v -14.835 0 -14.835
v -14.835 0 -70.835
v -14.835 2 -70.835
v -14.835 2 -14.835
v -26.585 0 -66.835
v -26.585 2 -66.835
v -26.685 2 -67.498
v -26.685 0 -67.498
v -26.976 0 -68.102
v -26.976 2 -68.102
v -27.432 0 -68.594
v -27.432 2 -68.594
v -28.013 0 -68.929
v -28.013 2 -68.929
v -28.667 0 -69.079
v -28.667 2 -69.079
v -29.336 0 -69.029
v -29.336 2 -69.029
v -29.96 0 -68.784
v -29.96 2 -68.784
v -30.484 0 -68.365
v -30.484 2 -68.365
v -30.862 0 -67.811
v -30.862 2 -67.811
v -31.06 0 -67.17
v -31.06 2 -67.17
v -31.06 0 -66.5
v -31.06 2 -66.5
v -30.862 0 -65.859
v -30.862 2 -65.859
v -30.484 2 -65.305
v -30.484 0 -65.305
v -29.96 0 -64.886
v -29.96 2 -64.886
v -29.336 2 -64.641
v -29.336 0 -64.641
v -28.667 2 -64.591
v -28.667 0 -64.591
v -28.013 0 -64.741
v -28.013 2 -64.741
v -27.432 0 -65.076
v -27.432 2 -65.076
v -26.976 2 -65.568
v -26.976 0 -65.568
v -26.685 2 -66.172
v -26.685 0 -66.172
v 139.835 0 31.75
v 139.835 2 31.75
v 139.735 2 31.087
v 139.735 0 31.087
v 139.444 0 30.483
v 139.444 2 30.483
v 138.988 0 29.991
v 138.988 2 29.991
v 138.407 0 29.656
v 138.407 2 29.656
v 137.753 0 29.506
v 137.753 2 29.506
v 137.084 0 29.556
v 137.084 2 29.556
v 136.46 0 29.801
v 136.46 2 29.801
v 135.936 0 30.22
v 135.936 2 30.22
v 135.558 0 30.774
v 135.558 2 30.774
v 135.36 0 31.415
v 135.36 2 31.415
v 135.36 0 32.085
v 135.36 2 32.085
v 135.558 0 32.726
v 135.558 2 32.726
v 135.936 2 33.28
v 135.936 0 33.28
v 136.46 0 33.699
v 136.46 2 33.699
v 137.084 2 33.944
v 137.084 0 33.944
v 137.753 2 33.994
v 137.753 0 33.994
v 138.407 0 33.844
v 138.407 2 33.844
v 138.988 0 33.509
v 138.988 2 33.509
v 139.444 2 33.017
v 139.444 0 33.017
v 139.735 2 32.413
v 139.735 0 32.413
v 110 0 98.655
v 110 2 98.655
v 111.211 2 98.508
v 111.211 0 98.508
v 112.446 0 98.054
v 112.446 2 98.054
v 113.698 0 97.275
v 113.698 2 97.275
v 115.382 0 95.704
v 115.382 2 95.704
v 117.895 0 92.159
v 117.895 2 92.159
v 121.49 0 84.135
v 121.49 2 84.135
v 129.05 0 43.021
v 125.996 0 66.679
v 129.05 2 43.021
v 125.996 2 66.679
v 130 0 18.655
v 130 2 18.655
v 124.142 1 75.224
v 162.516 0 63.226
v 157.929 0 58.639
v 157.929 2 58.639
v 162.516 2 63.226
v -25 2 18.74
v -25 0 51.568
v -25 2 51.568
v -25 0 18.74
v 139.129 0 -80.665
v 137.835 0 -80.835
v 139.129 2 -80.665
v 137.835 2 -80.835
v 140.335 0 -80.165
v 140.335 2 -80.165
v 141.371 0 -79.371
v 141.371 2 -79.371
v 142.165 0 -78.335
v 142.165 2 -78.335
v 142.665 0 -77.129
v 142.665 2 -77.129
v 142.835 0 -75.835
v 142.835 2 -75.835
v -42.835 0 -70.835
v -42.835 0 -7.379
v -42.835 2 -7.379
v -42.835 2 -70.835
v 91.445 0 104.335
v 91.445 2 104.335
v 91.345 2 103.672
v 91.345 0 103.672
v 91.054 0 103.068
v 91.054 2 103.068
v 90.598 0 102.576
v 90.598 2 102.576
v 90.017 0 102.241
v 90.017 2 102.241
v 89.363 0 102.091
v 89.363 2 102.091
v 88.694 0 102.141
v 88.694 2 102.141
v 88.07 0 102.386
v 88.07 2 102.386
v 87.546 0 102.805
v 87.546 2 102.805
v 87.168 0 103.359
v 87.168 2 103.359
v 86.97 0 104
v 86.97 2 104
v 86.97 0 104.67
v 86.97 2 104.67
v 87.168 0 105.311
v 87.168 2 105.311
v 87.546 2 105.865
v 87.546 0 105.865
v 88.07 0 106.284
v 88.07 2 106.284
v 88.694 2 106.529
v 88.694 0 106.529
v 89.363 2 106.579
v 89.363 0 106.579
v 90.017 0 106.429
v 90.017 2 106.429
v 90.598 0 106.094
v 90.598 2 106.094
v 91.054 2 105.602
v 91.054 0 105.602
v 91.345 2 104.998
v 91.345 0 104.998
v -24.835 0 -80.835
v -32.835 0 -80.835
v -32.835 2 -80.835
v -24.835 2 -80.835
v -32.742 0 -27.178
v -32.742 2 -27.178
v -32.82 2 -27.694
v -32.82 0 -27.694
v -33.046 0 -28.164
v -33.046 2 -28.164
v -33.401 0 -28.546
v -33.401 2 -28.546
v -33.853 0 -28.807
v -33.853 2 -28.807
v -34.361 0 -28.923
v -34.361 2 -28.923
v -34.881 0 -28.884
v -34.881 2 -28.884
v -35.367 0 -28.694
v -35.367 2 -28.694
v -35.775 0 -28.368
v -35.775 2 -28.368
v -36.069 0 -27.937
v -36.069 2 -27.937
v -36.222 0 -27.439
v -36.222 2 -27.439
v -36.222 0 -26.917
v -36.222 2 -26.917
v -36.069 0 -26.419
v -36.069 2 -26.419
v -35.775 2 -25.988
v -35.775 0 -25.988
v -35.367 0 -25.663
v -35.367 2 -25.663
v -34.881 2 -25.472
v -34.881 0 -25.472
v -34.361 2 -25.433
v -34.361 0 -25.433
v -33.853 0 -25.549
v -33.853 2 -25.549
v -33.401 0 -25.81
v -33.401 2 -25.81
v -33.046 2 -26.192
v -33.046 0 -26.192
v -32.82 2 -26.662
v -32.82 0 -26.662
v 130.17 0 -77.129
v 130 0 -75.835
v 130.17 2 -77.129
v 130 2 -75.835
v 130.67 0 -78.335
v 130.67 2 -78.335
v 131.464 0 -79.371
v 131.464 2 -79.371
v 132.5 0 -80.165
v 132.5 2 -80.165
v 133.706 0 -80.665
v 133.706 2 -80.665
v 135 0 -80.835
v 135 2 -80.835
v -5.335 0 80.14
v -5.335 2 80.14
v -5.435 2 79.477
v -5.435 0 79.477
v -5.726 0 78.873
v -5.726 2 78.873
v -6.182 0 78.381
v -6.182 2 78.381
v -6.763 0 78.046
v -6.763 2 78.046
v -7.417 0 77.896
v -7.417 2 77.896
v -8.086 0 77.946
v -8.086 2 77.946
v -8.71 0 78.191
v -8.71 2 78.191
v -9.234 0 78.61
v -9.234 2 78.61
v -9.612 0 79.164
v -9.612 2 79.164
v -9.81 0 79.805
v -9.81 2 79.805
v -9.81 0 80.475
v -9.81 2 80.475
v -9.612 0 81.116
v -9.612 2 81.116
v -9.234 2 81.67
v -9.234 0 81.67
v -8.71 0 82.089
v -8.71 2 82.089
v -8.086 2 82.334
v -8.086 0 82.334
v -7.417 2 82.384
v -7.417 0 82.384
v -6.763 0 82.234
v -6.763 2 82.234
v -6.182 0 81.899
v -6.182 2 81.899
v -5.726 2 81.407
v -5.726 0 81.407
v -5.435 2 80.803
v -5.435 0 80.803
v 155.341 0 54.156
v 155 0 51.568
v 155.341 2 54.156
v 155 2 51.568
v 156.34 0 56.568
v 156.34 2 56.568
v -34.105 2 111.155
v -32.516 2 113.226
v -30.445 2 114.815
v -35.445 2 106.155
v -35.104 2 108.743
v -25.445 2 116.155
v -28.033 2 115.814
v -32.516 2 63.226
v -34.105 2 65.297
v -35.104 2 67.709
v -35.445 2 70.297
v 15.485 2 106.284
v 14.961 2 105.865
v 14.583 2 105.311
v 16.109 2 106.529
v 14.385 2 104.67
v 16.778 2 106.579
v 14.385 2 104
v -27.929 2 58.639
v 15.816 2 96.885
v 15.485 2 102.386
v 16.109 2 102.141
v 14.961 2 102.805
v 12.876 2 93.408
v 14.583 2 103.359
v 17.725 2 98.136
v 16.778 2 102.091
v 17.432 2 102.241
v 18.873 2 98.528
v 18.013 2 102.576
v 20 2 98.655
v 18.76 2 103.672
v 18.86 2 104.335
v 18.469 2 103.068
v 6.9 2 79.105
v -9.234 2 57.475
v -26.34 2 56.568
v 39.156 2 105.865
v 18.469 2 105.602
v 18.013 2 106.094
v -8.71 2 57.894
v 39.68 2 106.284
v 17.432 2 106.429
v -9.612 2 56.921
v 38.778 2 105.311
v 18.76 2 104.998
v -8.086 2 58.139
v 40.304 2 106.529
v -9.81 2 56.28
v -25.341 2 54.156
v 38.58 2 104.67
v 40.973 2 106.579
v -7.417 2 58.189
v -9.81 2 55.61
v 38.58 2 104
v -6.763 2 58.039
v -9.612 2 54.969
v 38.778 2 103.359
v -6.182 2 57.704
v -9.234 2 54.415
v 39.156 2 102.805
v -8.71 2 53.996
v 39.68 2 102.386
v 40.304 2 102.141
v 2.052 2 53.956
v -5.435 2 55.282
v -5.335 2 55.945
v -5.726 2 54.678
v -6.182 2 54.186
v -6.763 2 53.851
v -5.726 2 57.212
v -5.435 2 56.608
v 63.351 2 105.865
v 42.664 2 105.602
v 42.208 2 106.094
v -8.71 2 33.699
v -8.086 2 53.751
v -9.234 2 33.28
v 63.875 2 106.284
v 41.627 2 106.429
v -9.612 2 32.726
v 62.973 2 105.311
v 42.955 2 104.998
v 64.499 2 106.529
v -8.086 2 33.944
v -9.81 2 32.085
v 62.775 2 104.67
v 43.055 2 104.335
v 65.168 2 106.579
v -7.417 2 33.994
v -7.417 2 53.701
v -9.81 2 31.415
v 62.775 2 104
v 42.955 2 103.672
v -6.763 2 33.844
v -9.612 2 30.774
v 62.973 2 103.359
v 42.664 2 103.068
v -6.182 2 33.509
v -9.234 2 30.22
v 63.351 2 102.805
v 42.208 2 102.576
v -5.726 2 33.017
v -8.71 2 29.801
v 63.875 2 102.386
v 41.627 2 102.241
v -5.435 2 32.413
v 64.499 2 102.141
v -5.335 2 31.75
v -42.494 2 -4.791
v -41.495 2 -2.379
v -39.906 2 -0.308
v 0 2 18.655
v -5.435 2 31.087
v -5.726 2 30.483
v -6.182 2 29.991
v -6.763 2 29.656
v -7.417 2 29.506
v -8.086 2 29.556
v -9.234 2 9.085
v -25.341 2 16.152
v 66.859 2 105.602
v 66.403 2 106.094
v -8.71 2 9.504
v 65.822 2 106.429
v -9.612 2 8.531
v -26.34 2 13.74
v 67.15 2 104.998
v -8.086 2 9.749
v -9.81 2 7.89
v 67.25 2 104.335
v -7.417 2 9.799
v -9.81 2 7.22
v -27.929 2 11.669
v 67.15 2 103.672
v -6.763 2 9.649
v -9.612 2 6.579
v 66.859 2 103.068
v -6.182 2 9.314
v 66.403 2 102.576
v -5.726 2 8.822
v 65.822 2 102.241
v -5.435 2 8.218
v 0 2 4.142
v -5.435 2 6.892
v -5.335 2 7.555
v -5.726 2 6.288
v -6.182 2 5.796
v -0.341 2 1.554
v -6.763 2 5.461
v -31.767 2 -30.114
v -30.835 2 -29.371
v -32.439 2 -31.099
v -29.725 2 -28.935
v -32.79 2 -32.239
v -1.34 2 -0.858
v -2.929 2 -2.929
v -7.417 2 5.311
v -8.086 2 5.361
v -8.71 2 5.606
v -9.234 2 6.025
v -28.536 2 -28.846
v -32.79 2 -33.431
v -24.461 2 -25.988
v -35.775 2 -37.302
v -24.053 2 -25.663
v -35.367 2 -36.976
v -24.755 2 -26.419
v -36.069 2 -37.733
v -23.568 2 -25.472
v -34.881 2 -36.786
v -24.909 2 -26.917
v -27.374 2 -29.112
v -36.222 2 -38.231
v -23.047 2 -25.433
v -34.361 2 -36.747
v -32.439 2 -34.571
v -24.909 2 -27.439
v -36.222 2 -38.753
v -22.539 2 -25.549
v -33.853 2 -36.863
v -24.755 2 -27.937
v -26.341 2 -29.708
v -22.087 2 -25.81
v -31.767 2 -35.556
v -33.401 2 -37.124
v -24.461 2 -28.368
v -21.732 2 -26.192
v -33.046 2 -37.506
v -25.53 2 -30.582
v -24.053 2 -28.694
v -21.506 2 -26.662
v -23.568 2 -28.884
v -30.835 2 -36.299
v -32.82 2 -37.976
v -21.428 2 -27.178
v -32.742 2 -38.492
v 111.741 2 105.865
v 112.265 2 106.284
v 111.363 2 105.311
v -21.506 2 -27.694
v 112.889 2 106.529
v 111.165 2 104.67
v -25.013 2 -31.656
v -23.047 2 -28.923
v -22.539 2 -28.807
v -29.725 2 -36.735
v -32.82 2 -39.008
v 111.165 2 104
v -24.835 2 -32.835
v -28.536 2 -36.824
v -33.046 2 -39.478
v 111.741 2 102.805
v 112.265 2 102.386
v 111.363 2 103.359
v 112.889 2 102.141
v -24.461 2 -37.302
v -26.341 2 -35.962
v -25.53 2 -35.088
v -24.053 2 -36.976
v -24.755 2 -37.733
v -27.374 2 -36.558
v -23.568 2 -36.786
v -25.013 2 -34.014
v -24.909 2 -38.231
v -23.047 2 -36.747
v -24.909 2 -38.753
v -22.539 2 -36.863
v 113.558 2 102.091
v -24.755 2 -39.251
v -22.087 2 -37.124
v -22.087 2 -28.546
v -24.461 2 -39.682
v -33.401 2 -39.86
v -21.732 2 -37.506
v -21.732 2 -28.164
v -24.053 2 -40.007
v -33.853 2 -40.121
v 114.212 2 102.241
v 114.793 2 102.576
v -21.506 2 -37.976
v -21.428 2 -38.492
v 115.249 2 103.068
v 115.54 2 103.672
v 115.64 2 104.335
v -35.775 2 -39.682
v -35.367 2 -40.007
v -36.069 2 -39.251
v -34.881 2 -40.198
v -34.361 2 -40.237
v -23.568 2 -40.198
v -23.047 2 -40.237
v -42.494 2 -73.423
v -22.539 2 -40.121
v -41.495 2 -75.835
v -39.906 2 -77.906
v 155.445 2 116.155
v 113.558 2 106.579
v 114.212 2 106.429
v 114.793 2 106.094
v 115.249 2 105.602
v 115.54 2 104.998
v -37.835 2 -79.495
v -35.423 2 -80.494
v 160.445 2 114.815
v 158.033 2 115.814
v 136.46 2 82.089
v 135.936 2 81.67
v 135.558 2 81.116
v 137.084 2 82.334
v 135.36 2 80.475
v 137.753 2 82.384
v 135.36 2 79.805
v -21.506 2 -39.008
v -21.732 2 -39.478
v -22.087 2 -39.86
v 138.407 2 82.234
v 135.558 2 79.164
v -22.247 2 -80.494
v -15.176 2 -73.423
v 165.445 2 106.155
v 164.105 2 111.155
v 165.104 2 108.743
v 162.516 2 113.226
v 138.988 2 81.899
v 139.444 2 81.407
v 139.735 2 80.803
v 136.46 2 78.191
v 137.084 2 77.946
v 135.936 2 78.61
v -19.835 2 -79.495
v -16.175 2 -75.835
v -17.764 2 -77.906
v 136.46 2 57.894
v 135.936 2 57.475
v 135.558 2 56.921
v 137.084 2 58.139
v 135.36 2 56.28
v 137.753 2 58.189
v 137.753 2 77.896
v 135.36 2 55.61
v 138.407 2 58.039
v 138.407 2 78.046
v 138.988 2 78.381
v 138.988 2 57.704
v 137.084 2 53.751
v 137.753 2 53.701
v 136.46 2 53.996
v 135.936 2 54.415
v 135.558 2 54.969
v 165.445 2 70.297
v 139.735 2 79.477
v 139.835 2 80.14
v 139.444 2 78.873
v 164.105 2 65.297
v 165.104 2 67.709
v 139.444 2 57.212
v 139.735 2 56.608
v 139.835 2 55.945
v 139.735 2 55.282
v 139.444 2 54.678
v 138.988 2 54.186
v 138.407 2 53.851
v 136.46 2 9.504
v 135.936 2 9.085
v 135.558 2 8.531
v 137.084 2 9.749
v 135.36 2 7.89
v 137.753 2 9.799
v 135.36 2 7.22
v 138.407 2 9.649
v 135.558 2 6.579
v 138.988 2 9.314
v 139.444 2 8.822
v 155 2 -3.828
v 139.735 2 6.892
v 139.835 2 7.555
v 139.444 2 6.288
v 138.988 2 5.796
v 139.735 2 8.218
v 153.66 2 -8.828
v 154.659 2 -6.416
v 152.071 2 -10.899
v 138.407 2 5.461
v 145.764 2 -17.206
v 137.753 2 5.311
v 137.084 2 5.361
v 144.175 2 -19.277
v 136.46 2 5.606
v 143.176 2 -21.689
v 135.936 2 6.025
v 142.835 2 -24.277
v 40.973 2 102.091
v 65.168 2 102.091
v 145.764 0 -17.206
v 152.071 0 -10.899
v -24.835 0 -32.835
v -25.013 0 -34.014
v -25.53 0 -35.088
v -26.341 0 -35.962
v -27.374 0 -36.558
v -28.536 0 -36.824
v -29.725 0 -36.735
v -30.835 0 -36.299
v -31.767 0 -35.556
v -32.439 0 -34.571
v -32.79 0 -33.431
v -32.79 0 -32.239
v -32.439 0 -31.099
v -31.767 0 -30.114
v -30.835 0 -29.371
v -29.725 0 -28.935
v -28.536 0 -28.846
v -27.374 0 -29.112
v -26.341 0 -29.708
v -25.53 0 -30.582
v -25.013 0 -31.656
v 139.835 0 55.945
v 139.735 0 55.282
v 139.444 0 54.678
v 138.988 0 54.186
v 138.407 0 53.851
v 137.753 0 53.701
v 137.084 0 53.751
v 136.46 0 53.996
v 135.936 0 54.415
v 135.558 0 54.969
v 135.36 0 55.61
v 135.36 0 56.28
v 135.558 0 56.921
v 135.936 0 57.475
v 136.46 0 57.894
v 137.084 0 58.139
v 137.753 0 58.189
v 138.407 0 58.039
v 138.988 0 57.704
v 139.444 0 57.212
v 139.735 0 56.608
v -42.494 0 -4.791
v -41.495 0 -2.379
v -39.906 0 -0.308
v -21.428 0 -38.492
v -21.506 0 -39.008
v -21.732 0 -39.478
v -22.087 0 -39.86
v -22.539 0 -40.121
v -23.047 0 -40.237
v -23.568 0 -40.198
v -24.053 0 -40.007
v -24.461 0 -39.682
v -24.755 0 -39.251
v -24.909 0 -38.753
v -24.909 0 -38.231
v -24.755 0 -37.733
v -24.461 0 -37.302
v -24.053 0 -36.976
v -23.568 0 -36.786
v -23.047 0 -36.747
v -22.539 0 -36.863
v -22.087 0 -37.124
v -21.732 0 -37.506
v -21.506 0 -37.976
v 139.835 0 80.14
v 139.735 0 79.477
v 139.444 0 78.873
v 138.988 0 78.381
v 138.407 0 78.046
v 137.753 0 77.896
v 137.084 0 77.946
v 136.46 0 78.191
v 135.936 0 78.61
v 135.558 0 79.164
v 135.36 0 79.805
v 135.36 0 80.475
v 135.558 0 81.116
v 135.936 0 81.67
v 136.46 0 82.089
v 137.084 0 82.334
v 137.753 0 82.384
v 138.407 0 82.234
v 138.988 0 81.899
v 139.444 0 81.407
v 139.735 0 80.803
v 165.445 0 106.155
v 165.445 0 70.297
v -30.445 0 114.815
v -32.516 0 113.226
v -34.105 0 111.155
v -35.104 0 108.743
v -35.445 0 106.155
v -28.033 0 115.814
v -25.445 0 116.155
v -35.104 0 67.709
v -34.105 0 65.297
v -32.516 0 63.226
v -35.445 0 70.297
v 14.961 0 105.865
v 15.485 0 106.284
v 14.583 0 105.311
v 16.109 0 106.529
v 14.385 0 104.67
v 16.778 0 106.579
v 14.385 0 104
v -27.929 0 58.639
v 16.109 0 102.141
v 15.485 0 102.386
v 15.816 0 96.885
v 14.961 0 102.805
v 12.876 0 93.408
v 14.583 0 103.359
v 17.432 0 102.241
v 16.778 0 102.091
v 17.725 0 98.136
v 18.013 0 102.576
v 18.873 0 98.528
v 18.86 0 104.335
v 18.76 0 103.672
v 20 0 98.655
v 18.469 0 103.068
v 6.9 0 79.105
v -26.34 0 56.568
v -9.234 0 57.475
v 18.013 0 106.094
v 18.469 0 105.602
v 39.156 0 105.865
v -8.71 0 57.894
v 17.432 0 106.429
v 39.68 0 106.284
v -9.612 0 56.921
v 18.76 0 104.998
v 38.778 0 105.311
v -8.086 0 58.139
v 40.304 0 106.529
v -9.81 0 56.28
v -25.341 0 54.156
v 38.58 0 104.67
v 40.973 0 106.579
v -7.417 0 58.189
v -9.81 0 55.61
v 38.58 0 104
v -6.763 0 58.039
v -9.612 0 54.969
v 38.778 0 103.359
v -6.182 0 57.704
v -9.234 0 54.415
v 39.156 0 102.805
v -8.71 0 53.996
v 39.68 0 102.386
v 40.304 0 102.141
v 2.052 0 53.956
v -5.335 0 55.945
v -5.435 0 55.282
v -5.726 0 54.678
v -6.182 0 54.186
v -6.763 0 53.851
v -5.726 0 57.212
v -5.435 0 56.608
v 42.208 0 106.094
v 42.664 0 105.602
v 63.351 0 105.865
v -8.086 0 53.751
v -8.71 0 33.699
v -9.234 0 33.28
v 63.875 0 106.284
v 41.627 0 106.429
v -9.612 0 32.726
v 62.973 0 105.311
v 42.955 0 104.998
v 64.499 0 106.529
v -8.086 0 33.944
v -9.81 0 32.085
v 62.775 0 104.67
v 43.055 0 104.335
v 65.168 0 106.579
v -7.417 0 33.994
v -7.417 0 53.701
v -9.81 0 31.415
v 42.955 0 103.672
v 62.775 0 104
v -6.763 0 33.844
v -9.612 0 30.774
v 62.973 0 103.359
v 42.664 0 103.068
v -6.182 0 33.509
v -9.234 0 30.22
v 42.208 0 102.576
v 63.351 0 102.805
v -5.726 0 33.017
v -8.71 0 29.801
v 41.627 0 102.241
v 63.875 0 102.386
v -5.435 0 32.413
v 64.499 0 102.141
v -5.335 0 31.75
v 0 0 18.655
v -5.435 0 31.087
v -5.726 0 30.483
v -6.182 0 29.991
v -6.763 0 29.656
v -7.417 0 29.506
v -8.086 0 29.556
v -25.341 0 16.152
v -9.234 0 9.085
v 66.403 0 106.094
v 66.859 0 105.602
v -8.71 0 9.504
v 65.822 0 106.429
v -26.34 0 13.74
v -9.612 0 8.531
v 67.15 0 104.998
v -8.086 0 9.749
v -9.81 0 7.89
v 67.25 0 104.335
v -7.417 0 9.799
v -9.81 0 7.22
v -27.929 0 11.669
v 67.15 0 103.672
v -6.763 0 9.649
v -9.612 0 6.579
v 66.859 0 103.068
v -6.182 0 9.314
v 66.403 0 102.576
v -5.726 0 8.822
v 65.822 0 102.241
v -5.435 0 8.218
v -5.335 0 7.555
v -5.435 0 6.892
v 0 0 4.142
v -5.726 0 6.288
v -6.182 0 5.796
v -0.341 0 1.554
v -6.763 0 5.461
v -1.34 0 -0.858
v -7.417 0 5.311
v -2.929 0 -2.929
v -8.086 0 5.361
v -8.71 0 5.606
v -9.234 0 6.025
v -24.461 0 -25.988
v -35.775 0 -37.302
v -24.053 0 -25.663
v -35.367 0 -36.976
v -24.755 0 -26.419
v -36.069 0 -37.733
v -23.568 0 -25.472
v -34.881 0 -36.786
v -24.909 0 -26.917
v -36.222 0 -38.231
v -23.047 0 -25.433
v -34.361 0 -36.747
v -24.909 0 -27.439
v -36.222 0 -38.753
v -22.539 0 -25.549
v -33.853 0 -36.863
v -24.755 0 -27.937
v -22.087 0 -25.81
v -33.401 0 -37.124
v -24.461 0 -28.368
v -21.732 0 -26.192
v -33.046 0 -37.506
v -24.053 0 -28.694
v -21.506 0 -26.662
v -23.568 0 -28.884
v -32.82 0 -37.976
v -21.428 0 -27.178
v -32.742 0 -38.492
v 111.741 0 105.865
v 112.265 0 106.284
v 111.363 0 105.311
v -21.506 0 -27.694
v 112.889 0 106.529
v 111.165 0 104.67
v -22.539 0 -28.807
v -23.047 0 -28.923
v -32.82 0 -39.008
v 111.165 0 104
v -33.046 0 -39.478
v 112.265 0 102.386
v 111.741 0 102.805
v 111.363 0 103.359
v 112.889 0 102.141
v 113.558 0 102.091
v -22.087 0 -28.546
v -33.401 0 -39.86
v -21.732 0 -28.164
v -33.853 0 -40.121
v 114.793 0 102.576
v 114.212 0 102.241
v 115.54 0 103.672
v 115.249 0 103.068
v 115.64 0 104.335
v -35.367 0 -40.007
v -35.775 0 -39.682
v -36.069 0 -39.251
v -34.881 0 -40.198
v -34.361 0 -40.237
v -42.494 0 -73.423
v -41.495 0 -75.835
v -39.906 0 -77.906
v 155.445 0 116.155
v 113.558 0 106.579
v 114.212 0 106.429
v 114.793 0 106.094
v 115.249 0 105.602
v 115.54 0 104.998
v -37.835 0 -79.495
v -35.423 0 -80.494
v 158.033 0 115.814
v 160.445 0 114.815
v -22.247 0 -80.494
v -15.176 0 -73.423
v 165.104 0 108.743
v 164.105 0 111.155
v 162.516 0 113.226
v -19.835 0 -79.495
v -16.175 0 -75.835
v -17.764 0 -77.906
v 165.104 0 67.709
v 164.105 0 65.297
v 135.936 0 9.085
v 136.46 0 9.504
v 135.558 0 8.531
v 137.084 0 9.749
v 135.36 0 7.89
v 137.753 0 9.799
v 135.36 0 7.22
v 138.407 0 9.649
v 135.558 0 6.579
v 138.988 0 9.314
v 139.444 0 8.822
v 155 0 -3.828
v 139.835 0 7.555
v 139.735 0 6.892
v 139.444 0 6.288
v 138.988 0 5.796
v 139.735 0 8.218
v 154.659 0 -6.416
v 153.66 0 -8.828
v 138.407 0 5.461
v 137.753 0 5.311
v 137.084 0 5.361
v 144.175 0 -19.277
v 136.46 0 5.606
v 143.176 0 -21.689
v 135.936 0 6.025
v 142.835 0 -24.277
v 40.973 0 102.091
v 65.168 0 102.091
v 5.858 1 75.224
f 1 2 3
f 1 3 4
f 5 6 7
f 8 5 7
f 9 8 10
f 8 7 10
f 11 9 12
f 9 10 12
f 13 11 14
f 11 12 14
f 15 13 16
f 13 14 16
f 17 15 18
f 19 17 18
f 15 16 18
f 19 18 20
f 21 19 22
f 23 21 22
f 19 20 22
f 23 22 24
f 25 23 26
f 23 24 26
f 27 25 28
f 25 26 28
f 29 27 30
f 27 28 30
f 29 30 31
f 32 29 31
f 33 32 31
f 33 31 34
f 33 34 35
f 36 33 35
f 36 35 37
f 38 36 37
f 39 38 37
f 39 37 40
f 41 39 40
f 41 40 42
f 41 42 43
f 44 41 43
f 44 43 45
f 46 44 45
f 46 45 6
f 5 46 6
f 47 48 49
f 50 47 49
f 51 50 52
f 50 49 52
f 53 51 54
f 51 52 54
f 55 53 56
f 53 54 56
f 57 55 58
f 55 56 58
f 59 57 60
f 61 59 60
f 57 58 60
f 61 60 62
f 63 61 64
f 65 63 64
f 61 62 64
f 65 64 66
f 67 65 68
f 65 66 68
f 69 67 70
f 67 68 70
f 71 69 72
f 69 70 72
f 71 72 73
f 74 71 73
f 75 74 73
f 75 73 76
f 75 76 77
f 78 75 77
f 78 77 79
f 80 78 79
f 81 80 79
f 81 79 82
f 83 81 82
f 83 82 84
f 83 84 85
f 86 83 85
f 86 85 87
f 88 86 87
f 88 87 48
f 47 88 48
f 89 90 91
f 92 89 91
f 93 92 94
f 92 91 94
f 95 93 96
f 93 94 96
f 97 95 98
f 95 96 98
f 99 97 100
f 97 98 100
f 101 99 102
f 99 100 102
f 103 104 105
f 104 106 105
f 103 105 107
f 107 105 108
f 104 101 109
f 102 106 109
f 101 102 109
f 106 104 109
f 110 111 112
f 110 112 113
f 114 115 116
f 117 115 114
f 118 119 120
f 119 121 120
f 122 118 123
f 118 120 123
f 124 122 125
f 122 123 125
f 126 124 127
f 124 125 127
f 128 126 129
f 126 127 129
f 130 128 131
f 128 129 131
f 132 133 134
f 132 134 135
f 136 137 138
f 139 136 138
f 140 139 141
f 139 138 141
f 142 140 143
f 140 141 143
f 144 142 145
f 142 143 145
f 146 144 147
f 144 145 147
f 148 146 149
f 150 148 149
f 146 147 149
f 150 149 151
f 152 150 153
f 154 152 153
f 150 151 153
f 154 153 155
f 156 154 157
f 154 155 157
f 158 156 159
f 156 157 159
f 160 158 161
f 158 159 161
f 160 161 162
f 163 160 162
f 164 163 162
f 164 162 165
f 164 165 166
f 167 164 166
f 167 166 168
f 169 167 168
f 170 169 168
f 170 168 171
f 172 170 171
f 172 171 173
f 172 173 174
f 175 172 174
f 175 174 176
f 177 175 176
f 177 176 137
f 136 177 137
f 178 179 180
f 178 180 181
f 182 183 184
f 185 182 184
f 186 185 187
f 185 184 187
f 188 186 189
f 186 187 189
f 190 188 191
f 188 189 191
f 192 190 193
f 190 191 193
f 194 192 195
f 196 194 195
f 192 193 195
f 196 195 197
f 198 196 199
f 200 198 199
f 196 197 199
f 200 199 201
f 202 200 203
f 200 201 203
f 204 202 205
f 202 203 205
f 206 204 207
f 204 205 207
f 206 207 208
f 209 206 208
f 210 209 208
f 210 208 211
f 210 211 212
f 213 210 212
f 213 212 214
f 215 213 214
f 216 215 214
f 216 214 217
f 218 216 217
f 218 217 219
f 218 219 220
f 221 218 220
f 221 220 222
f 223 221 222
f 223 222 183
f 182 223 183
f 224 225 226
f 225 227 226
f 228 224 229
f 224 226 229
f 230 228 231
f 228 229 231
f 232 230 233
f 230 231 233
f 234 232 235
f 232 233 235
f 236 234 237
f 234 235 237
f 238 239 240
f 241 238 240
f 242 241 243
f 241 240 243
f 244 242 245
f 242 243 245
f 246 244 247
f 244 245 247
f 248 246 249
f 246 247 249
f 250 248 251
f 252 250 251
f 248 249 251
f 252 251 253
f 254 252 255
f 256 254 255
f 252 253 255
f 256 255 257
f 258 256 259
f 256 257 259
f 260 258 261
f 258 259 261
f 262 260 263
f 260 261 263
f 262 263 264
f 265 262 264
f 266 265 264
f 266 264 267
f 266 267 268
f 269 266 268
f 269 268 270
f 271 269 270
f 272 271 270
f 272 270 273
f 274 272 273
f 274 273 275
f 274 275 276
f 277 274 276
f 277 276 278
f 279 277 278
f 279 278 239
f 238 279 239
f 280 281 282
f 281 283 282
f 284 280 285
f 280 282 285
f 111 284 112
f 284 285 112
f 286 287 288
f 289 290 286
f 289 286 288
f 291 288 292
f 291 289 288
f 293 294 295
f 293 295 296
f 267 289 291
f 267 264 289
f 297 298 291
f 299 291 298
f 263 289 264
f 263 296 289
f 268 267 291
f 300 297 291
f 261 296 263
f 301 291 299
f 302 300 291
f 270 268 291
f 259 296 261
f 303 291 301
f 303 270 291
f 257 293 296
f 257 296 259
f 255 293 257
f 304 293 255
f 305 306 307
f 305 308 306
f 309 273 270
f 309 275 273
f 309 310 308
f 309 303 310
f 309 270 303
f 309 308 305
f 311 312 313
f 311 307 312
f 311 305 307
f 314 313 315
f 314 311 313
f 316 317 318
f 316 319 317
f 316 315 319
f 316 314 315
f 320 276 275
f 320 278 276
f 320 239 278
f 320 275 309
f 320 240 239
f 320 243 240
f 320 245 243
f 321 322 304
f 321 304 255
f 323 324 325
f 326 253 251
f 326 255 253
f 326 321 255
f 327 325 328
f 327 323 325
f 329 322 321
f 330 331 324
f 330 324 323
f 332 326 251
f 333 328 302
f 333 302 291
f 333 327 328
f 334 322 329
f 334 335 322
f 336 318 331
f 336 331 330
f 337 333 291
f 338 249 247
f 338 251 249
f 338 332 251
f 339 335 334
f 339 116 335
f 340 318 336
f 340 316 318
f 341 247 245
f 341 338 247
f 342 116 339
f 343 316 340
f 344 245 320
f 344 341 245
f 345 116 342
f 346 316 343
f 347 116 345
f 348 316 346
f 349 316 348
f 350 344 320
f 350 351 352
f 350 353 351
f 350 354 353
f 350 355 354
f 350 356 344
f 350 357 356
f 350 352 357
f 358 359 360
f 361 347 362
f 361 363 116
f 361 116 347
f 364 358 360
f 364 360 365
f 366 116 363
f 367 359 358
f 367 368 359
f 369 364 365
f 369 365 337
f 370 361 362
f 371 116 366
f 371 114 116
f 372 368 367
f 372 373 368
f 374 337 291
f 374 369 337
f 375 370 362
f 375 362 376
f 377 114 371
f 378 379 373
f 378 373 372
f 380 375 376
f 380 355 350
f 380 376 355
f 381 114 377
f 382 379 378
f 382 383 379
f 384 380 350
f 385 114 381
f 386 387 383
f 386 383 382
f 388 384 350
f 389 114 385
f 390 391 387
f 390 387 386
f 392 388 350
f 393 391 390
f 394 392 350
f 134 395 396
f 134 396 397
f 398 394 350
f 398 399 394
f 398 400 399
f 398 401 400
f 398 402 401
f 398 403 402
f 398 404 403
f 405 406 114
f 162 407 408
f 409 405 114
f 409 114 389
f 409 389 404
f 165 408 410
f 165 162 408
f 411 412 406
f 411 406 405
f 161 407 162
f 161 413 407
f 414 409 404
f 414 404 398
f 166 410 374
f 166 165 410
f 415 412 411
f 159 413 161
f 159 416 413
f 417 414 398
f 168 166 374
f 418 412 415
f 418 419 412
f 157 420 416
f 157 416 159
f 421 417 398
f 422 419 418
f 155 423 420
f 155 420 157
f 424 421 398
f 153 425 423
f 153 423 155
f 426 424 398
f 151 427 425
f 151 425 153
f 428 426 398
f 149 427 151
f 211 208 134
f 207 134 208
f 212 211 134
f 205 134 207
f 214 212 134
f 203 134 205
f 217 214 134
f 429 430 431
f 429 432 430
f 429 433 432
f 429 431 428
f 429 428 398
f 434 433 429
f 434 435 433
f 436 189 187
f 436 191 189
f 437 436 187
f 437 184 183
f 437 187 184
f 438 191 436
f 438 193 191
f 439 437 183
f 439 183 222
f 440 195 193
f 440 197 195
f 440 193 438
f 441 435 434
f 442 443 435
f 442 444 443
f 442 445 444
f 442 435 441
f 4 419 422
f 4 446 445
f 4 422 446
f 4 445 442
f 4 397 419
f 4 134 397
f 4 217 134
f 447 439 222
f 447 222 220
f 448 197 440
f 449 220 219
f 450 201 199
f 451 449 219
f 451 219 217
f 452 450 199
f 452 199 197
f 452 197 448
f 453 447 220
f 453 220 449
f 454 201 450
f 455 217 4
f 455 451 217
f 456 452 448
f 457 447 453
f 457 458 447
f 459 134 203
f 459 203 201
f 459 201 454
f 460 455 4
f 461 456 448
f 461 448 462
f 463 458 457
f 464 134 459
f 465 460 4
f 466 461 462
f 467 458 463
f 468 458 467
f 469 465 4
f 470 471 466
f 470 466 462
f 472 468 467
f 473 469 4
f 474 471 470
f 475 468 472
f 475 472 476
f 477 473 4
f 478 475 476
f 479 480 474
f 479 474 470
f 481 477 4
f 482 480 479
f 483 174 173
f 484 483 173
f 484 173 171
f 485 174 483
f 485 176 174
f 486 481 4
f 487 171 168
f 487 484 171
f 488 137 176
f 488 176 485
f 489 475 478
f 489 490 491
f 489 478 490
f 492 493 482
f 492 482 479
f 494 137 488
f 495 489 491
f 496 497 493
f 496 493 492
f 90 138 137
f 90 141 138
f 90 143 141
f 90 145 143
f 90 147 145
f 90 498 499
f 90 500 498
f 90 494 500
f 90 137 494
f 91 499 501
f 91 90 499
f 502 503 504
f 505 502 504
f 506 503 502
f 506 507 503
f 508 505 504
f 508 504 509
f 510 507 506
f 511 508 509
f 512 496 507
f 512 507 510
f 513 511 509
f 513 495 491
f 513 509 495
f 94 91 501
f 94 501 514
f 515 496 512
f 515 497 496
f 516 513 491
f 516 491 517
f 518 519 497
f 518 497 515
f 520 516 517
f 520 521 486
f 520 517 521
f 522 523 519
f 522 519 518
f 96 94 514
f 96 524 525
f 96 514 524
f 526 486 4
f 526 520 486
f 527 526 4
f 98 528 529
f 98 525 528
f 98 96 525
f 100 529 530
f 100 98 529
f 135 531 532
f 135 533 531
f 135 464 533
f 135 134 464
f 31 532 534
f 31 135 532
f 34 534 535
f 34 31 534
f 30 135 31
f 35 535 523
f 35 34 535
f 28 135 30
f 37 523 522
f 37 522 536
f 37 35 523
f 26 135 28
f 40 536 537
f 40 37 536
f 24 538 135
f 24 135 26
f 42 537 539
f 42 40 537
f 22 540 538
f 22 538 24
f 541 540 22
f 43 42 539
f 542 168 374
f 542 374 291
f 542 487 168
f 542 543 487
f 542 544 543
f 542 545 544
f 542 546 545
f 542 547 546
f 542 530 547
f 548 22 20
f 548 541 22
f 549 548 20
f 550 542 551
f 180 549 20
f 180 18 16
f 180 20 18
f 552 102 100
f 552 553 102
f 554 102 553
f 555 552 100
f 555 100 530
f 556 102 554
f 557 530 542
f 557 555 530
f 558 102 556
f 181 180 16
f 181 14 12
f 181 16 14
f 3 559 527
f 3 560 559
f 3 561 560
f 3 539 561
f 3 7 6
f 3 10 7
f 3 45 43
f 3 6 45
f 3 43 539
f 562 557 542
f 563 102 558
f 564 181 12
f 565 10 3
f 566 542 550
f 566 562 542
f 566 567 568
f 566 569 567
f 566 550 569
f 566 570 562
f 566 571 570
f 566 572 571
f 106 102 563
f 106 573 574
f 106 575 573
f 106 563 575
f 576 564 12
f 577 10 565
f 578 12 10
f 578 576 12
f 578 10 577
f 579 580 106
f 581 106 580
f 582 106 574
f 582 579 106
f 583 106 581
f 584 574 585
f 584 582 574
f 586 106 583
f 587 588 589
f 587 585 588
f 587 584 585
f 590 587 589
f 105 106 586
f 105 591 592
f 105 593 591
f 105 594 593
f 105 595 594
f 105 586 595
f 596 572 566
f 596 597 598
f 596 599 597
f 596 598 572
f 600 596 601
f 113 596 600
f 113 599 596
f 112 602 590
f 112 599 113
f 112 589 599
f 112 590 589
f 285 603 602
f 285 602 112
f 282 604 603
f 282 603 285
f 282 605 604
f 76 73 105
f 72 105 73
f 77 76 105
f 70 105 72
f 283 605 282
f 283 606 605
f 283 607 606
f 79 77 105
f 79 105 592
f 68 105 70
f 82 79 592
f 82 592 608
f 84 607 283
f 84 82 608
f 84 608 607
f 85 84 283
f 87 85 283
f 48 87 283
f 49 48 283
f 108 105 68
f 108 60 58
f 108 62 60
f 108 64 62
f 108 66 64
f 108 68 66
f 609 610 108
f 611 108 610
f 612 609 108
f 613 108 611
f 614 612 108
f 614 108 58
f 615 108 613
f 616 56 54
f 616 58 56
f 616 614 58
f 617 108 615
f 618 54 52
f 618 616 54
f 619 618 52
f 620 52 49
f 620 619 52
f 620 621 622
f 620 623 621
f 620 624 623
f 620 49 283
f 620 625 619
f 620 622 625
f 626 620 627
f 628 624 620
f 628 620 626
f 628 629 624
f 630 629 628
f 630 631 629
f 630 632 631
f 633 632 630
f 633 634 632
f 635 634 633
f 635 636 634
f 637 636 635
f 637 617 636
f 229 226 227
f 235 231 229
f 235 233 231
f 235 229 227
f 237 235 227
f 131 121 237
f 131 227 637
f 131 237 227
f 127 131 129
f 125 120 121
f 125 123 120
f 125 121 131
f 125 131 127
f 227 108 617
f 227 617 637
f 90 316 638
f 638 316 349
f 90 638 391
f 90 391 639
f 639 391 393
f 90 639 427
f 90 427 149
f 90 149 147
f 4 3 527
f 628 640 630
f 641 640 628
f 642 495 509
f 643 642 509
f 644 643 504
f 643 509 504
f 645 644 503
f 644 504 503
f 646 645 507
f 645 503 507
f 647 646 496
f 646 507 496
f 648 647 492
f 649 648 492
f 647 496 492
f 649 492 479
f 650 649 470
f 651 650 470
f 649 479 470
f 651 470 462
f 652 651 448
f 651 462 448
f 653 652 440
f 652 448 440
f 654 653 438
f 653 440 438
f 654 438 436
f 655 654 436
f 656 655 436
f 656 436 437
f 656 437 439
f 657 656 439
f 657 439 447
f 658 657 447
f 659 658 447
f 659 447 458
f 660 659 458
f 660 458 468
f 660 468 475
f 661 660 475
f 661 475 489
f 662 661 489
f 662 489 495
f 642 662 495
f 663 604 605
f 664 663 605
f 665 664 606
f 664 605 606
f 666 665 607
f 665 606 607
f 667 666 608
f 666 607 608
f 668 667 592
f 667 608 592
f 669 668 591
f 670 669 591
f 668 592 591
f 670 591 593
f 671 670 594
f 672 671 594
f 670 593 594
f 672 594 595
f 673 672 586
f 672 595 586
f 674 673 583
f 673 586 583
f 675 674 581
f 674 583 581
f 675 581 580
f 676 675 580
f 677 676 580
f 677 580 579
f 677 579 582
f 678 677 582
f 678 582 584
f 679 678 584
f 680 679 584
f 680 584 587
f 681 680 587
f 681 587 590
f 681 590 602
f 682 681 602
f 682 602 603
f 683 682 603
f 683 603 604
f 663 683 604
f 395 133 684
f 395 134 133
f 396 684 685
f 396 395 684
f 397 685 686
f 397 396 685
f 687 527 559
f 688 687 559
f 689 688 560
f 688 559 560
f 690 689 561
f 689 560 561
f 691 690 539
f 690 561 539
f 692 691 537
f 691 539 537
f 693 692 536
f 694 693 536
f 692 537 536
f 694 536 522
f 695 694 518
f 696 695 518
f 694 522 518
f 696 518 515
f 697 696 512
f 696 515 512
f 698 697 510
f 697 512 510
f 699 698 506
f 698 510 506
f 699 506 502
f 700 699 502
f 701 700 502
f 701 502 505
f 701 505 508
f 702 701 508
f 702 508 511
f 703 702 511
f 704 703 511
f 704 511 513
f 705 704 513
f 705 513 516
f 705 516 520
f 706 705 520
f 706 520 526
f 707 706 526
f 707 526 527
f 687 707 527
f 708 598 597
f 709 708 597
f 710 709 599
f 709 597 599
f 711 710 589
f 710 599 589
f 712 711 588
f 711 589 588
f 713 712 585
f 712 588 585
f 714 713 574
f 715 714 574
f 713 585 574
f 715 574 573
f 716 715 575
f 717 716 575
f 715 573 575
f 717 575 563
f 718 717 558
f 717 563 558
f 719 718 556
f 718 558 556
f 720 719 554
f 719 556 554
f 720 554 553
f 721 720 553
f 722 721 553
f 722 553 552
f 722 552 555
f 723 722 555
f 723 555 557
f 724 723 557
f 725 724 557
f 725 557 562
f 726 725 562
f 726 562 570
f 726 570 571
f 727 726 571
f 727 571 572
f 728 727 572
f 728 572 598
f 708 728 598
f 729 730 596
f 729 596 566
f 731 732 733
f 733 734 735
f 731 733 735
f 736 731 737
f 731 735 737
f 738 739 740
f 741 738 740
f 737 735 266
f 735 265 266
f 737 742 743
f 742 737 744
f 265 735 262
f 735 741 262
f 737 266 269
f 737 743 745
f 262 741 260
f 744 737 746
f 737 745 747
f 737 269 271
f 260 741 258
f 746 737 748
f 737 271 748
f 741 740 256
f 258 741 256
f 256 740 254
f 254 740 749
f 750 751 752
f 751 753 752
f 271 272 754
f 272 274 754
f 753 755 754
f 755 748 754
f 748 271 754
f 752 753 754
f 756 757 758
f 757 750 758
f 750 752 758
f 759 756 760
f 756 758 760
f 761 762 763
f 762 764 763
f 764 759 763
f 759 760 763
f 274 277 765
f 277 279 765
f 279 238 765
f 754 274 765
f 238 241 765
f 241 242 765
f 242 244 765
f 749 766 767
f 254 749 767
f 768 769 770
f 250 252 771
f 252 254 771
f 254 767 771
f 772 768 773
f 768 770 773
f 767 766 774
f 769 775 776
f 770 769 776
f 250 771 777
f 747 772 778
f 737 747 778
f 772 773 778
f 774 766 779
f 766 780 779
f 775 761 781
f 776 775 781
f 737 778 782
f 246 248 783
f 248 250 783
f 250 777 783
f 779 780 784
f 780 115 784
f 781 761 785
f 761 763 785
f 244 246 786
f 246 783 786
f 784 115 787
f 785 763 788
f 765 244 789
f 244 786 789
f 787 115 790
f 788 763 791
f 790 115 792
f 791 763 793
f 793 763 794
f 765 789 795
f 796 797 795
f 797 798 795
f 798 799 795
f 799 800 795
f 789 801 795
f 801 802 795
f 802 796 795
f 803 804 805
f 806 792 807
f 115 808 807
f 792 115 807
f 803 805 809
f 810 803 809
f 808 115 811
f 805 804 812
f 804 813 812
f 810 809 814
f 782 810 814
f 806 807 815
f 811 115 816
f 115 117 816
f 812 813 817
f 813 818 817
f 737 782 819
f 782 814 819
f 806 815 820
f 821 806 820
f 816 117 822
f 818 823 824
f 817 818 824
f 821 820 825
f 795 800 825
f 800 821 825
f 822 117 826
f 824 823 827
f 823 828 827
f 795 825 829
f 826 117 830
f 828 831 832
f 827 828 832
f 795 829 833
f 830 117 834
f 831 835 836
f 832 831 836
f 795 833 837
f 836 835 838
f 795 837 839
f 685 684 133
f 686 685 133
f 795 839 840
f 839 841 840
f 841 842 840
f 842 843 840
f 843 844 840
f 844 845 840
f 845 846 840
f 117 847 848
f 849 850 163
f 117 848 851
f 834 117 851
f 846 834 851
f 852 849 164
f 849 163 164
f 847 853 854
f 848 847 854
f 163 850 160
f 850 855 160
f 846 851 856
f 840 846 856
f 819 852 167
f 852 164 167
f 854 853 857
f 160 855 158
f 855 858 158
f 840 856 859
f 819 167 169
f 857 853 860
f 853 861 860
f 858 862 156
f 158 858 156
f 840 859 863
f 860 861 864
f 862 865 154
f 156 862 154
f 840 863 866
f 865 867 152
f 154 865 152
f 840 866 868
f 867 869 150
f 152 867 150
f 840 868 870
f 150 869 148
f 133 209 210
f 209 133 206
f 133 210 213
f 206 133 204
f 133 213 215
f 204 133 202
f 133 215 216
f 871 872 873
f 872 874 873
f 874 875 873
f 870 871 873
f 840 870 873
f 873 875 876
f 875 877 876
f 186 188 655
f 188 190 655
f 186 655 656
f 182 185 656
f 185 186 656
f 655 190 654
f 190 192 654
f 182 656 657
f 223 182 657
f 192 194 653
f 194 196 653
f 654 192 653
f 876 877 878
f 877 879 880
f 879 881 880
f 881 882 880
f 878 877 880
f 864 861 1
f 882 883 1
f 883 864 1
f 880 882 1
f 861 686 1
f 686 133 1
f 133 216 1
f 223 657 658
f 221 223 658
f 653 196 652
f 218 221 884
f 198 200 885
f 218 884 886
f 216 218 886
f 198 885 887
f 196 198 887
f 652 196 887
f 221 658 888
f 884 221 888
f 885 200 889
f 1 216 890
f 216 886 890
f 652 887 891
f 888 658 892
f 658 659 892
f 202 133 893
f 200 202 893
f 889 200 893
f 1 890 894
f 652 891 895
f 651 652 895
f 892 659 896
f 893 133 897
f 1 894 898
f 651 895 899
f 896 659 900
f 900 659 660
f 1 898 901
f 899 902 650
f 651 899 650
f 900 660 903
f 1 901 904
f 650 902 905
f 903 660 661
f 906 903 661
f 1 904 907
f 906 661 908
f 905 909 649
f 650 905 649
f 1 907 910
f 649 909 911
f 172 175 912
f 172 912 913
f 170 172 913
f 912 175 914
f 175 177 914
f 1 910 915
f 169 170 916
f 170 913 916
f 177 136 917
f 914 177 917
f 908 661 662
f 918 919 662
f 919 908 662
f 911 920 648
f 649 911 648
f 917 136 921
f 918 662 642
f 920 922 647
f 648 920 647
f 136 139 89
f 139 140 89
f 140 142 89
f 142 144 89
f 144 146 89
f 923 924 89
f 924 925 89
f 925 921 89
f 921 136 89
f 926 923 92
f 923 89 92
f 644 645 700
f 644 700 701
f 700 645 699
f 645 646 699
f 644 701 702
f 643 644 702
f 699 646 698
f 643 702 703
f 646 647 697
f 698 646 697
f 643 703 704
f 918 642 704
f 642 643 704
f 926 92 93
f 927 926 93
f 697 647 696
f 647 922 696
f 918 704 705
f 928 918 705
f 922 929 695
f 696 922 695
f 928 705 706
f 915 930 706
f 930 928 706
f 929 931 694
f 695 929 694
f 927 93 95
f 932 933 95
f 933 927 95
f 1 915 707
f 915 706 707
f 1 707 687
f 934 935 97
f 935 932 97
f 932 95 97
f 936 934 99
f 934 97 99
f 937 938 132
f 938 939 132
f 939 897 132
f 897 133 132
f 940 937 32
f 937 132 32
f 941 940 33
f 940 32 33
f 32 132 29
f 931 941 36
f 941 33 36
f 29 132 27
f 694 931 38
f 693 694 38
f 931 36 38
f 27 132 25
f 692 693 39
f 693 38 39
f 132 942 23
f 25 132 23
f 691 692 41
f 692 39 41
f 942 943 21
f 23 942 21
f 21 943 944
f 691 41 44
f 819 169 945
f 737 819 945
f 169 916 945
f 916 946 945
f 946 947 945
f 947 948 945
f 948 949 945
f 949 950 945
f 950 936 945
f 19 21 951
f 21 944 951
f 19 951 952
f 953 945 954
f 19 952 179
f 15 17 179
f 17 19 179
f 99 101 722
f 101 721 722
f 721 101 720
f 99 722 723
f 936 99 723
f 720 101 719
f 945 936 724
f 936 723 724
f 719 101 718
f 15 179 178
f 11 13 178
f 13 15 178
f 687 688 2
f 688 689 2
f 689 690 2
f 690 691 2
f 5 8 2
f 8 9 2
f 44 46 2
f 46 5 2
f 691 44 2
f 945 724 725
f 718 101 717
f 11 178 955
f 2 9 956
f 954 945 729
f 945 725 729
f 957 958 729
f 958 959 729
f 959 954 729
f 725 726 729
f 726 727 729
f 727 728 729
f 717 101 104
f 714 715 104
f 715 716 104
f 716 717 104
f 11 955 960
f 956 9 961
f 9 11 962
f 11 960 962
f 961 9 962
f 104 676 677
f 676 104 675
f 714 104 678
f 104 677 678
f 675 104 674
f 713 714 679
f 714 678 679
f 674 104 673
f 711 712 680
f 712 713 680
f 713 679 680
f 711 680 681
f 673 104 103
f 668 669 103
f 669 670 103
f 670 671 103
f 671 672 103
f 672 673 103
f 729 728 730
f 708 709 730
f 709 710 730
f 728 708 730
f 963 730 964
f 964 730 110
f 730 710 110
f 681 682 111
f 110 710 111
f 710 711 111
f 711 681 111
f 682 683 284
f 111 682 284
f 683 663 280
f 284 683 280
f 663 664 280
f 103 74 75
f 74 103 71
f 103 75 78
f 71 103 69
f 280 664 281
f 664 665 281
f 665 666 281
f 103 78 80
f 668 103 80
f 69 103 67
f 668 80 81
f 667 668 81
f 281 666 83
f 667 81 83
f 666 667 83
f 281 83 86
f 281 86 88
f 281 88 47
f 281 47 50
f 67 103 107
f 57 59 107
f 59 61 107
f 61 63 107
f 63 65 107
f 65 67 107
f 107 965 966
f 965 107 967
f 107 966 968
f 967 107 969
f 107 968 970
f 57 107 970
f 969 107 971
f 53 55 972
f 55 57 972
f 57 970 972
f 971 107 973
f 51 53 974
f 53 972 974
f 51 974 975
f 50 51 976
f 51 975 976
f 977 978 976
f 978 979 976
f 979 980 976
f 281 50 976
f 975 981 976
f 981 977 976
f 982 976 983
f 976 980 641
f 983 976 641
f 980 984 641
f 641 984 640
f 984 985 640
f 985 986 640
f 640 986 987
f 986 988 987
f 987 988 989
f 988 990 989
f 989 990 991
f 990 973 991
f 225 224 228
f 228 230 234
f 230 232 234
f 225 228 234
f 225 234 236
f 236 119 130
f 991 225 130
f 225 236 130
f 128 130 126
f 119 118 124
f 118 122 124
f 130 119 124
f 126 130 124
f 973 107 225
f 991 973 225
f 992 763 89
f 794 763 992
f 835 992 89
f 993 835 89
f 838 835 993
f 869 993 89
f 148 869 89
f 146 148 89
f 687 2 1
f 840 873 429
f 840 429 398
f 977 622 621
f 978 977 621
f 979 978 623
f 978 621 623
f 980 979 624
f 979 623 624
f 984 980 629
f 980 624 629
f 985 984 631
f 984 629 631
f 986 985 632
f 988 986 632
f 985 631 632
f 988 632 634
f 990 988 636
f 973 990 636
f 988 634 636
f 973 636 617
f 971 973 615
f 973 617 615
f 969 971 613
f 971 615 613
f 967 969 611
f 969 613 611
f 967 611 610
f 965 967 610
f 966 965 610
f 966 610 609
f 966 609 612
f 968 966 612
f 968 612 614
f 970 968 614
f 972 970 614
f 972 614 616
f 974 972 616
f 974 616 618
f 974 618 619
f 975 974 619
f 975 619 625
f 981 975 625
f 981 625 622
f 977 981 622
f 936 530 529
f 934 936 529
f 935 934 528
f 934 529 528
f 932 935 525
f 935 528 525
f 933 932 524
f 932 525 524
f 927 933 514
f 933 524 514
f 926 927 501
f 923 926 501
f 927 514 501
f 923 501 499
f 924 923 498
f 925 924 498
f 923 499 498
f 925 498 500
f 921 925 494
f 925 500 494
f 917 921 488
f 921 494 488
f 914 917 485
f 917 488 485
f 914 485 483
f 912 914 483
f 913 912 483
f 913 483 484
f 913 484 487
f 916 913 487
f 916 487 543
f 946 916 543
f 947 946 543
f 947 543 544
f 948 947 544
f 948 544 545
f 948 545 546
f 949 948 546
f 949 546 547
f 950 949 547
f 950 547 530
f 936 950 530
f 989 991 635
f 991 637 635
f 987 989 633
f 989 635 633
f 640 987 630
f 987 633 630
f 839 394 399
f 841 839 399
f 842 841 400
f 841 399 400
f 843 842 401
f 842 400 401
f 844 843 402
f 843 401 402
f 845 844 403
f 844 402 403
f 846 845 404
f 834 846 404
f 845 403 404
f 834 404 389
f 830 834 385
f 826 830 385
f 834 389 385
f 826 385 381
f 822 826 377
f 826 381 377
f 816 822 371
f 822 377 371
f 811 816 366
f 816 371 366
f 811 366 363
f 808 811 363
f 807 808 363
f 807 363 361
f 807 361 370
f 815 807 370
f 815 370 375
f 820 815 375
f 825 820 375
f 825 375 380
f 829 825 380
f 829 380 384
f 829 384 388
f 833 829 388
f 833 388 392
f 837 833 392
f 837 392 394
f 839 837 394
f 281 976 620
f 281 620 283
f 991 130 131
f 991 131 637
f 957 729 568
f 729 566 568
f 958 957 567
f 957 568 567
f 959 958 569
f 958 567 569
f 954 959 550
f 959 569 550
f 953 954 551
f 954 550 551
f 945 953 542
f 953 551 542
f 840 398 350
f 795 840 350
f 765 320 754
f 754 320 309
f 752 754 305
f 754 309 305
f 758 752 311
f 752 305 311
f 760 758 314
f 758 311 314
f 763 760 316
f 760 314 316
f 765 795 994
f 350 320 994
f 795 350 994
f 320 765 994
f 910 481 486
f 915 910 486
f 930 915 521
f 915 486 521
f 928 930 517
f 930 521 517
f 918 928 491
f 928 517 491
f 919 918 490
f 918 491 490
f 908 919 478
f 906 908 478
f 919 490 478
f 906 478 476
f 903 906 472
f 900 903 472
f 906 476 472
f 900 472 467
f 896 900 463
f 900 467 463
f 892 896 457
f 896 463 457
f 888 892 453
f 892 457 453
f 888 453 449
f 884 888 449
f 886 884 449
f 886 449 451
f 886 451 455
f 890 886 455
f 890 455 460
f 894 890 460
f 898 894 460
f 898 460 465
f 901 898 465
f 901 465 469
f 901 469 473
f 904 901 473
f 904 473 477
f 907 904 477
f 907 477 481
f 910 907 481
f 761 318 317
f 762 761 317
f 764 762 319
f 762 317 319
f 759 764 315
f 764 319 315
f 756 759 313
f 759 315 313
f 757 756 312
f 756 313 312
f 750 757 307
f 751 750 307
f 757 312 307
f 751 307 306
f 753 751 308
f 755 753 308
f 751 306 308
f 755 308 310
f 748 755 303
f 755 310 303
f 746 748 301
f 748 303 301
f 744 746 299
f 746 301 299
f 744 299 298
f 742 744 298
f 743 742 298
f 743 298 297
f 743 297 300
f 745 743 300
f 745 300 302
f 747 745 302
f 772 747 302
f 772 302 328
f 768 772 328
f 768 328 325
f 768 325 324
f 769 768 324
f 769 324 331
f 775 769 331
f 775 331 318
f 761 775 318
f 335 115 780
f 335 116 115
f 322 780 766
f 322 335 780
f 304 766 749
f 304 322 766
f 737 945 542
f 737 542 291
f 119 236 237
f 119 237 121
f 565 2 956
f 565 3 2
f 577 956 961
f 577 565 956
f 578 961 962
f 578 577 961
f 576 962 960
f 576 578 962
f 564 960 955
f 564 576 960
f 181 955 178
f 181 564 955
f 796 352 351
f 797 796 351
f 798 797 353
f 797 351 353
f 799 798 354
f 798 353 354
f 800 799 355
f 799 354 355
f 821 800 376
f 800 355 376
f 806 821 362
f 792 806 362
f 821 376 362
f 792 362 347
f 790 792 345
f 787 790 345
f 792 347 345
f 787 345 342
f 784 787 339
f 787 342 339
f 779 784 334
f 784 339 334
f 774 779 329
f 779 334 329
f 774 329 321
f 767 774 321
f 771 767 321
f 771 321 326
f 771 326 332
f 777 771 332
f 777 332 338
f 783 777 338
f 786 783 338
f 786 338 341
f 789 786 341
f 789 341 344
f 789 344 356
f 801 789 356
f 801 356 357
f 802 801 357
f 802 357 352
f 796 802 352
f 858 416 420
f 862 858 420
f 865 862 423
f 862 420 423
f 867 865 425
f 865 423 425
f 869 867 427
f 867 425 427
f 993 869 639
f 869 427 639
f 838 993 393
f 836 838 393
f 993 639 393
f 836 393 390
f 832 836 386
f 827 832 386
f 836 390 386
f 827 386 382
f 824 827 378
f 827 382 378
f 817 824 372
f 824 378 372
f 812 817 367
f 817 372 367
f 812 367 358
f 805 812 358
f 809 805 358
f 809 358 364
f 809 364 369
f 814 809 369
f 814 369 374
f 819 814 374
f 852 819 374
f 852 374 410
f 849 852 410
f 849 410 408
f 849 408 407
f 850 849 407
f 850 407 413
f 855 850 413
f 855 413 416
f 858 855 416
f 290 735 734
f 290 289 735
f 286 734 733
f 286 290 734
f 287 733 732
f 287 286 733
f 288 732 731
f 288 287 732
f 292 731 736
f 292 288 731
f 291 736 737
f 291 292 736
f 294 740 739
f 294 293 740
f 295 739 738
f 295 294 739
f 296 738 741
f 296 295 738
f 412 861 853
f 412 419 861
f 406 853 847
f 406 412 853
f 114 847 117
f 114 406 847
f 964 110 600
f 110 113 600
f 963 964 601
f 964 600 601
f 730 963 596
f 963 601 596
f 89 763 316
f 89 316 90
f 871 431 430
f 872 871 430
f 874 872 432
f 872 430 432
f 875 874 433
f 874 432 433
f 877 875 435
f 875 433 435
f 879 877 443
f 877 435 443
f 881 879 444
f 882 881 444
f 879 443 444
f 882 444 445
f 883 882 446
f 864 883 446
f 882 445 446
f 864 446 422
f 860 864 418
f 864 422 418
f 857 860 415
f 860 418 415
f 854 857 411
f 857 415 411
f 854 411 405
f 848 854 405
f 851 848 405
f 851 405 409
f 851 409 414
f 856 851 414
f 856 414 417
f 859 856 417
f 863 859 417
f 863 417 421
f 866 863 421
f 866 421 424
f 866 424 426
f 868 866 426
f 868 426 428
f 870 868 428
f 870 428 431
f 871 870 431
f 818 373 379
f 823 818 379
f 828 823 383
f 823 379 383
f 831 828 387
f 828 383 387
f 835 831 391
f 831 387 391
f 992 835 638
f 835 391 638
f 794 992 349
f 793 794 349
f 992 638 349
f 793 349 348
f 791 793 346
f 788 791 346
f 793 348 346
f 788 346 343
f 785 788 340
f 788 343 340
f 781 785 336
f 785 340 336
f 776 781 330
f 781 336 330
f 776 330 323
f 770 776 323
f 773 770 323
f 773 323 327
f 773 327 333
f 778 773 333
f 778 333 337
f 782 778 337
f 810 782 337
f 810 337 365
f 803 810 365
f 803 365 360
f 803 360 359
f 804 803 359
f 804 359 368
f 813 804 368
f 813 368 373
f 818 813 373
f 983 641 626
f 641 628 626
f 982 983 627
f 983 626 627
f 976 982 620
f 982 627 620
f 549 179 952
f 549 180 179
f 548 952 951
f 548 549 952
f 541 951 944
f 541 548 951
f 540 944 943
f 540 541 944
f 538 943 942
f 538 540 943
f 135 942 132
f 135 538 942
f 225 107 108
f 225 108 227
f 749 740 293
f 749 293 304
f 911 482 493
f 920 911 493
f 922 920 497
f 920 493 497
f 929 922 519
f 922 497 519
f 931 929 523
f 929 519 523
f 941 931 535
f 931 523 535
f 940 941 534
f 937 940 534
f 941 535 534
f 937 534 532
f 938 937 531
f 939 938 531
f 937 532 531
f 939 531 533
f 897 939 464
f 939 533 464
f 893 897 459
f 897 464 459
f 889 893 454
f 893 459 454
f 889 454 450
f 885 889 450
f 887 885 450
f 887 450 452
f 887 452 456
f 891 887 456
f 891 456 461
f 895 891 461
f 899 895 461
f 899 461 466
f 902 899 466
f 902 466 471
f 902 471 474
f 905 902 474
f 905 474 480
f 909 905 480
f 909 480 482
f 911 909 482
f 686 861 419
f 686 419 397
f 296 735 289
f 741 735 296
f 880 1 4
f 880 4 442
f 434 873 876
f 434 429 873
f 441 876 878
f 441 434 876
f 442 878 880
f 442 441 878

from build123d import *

# Parameters (mm, degrees)
BOSS_EXTRUDE1_DEPTH = 2
SKETCH2_R           = 1.75
SKETCH2_R_2         = 4
SKETCH2_R_3         = 2.25
CUT_EXTRUDE2_DEPTH  = 3
FILLET1_R           = 10
BOSS_EXTRUDE3_DEPTH = 2
FILLET3_R           = 5
SKETCH4_R           = 2.25
CUT_EXTRUDE3_DEPTH  = 3.0000001


with BuildPart() as part:
    # Sketch1 → Boss-Extrude1 (new body)
    with BuildSketch(Plane(origin=(0, 0, 0), x_dir=(1, 0, 0), z_dir=(0, 1, 0))):
        Polygon((0, 0), (0, -98.655), (130, -98.655), (130, 80.835), (142.835, 80.835), (142.835, 20.135), (155, 7.97), (155, -55.71), (165.445, -66.155), (165.445, -116.155), (-35.445, -116.155), (-35.445, -66.155), (-25, -55.71), (-25, -14.597979746), (-42.835, 3.237020254), (-42.835, 80.835), (-14.835, 80.835), (-14.835, 14.835), align=None)
    extrude(amount=BOSS_EXTRUDE1_DEPTH)

    # Sketch2 → Cut-Extrude2 (cut, through all)
    with BuildSketch(Plane(origin=(0, 2, 0), x_dir=(1, 0, 0), z_dir=(0, 1, 0))):
        with Locations((-23.178145751, 38.49185425)):
            Circle(SKETCH2_R)
        with Locations((-23.178145751, 27.178145751)):
            Circle(SKETCH2_R)
        with Locations((-34.491854249, 27.178145751)):
            Circle(SKETCH2_R)
        with Locations((-34.491854249, 38.49185425)):
            Circle(SKETCH2_R)
        with Locations((-28.835, 32.835)):
            Circle(SKETCH2_R_2)
        with Locations((137.585, -80.14)):
            Circle(SKETCH2_R_3)
        with Locations((-7.585, -80.14)):
            Circle(SKETCH2_R_3)
        with Locations((137.585, -55.945)):
            Circle(SKETCH2_R_3)
        with Locations((-7.585, -55.945)):
            Circle(SKETCH2_R_3)
        with Locations((137.585, -31.75)):
            Circle(SKETCH2_R_3)
        with Locations((-7.585, -31.75)):
            Circle(SKETCH2_R_3)
        with Locations((137.585, -7.555)):
            Circle(SKETCH2_R_3)
        with Locations((-7.585, -7.555)):
            Circle(SKETCH2_R_3)
        with Locations((16.61, -104.335)):
            Circle(SKETCH2_R_3)
        with Locations((40.805, -104.335)):
            Circle(SKETCH2_R_3)
        with Locations((65, -104.335)):
            Circle(SKETCH2_R_3)
        with Locations((89.195, -104.335)):
            Circle(SKETCH2_R_3)
        with Locations((113.39, -104.335)):
            Circle(SKETCH2_R_3)
    extrude(amount=-CUT_EXTRUDE2_DEPTH, mode=Mode.SUBTRACT)

    # Fillet1
    fillet1_edges = [part.edges().sort_by_distance(p)[0] for p in [
        (0, 1, 0),
        (142.835, 1, -20.135),
        (155, 1, -7.97),
        (155, 1, 55.71),
        (165.445, 1, 66.155),
        (165.445, 1, 116.155),
        (-35.445, 1, 116.155),
        (-35.445, 1, 66.155),
        (-25, 1, 55.71),
        (-25, 1, 14.597979746),
        (-42.835, 1, -3.237020254),
        (-42.835, 1, -80.835),
        (-14.835, 1, -80.835),
    ]]
    fillet(fillet1_edges, radius=FILLET1_R)

    # Sketch3 → Boss-Extrude3 (add, through all)
    with BuildSketch(Plane(origin=(0, 2, 0), x_dir=(1, 0, 0), z_dir=(0, 1, 0))):
        with BuildLine():
            Line((0, -18.655), (0, -98.655))
            Line((0, -98.655), (20, -98.655))
            add(Edge.make_bspline(
                [(0, -18.655), (0, -98.655), (20, -98.655)],
                knots=[4.71238898, 4.71238898, 4.71238898, 6.283185307, 6.283185307, 6.283185307], degree=2, weights=[1, 0.707106781, 1]))
        make_face()
        with BuildLine():
            Line((130, -98.655), (110, -98.655))
            add(Edge.make_bspline(
                [(110, -98.655), (130, -98.655), (130, -18.655)],
                knots=[0, 0, 0, 1.570796327, 1.570796327, 1.570796327], degree=2, weights=[1, 0.707106781, 1]))
            Line((130, -18.655), (130, -98.655))
        make_face()
    extrude(amount=-BOSS_EXTRUDE3_DEPTH)

    # Fillet3
    fillet3_edges = [part.edges().sort_by_distance(p)[0] for p in [
        (130, 1, -80.835),
        (142.835, 1, -80.835),
    ]]
    fillet(fillet3_edges, radius=FILLET3_R)

    # Sketch4 → Cut-Extrude3 (cut, through all)
    with BuildSketch(Plane(origin=(0, 2, 0), x_dir=(1, 0, 0), z_dir=(0, 1, 0))):
        with Locations((-28.835, 66.835)):
            Circle(SKETCH4_R)
    extrude(amount=-CUT_EXTRUDE3_DEPTH, mode=Mode.SUBTRACT)


solid = part.part
